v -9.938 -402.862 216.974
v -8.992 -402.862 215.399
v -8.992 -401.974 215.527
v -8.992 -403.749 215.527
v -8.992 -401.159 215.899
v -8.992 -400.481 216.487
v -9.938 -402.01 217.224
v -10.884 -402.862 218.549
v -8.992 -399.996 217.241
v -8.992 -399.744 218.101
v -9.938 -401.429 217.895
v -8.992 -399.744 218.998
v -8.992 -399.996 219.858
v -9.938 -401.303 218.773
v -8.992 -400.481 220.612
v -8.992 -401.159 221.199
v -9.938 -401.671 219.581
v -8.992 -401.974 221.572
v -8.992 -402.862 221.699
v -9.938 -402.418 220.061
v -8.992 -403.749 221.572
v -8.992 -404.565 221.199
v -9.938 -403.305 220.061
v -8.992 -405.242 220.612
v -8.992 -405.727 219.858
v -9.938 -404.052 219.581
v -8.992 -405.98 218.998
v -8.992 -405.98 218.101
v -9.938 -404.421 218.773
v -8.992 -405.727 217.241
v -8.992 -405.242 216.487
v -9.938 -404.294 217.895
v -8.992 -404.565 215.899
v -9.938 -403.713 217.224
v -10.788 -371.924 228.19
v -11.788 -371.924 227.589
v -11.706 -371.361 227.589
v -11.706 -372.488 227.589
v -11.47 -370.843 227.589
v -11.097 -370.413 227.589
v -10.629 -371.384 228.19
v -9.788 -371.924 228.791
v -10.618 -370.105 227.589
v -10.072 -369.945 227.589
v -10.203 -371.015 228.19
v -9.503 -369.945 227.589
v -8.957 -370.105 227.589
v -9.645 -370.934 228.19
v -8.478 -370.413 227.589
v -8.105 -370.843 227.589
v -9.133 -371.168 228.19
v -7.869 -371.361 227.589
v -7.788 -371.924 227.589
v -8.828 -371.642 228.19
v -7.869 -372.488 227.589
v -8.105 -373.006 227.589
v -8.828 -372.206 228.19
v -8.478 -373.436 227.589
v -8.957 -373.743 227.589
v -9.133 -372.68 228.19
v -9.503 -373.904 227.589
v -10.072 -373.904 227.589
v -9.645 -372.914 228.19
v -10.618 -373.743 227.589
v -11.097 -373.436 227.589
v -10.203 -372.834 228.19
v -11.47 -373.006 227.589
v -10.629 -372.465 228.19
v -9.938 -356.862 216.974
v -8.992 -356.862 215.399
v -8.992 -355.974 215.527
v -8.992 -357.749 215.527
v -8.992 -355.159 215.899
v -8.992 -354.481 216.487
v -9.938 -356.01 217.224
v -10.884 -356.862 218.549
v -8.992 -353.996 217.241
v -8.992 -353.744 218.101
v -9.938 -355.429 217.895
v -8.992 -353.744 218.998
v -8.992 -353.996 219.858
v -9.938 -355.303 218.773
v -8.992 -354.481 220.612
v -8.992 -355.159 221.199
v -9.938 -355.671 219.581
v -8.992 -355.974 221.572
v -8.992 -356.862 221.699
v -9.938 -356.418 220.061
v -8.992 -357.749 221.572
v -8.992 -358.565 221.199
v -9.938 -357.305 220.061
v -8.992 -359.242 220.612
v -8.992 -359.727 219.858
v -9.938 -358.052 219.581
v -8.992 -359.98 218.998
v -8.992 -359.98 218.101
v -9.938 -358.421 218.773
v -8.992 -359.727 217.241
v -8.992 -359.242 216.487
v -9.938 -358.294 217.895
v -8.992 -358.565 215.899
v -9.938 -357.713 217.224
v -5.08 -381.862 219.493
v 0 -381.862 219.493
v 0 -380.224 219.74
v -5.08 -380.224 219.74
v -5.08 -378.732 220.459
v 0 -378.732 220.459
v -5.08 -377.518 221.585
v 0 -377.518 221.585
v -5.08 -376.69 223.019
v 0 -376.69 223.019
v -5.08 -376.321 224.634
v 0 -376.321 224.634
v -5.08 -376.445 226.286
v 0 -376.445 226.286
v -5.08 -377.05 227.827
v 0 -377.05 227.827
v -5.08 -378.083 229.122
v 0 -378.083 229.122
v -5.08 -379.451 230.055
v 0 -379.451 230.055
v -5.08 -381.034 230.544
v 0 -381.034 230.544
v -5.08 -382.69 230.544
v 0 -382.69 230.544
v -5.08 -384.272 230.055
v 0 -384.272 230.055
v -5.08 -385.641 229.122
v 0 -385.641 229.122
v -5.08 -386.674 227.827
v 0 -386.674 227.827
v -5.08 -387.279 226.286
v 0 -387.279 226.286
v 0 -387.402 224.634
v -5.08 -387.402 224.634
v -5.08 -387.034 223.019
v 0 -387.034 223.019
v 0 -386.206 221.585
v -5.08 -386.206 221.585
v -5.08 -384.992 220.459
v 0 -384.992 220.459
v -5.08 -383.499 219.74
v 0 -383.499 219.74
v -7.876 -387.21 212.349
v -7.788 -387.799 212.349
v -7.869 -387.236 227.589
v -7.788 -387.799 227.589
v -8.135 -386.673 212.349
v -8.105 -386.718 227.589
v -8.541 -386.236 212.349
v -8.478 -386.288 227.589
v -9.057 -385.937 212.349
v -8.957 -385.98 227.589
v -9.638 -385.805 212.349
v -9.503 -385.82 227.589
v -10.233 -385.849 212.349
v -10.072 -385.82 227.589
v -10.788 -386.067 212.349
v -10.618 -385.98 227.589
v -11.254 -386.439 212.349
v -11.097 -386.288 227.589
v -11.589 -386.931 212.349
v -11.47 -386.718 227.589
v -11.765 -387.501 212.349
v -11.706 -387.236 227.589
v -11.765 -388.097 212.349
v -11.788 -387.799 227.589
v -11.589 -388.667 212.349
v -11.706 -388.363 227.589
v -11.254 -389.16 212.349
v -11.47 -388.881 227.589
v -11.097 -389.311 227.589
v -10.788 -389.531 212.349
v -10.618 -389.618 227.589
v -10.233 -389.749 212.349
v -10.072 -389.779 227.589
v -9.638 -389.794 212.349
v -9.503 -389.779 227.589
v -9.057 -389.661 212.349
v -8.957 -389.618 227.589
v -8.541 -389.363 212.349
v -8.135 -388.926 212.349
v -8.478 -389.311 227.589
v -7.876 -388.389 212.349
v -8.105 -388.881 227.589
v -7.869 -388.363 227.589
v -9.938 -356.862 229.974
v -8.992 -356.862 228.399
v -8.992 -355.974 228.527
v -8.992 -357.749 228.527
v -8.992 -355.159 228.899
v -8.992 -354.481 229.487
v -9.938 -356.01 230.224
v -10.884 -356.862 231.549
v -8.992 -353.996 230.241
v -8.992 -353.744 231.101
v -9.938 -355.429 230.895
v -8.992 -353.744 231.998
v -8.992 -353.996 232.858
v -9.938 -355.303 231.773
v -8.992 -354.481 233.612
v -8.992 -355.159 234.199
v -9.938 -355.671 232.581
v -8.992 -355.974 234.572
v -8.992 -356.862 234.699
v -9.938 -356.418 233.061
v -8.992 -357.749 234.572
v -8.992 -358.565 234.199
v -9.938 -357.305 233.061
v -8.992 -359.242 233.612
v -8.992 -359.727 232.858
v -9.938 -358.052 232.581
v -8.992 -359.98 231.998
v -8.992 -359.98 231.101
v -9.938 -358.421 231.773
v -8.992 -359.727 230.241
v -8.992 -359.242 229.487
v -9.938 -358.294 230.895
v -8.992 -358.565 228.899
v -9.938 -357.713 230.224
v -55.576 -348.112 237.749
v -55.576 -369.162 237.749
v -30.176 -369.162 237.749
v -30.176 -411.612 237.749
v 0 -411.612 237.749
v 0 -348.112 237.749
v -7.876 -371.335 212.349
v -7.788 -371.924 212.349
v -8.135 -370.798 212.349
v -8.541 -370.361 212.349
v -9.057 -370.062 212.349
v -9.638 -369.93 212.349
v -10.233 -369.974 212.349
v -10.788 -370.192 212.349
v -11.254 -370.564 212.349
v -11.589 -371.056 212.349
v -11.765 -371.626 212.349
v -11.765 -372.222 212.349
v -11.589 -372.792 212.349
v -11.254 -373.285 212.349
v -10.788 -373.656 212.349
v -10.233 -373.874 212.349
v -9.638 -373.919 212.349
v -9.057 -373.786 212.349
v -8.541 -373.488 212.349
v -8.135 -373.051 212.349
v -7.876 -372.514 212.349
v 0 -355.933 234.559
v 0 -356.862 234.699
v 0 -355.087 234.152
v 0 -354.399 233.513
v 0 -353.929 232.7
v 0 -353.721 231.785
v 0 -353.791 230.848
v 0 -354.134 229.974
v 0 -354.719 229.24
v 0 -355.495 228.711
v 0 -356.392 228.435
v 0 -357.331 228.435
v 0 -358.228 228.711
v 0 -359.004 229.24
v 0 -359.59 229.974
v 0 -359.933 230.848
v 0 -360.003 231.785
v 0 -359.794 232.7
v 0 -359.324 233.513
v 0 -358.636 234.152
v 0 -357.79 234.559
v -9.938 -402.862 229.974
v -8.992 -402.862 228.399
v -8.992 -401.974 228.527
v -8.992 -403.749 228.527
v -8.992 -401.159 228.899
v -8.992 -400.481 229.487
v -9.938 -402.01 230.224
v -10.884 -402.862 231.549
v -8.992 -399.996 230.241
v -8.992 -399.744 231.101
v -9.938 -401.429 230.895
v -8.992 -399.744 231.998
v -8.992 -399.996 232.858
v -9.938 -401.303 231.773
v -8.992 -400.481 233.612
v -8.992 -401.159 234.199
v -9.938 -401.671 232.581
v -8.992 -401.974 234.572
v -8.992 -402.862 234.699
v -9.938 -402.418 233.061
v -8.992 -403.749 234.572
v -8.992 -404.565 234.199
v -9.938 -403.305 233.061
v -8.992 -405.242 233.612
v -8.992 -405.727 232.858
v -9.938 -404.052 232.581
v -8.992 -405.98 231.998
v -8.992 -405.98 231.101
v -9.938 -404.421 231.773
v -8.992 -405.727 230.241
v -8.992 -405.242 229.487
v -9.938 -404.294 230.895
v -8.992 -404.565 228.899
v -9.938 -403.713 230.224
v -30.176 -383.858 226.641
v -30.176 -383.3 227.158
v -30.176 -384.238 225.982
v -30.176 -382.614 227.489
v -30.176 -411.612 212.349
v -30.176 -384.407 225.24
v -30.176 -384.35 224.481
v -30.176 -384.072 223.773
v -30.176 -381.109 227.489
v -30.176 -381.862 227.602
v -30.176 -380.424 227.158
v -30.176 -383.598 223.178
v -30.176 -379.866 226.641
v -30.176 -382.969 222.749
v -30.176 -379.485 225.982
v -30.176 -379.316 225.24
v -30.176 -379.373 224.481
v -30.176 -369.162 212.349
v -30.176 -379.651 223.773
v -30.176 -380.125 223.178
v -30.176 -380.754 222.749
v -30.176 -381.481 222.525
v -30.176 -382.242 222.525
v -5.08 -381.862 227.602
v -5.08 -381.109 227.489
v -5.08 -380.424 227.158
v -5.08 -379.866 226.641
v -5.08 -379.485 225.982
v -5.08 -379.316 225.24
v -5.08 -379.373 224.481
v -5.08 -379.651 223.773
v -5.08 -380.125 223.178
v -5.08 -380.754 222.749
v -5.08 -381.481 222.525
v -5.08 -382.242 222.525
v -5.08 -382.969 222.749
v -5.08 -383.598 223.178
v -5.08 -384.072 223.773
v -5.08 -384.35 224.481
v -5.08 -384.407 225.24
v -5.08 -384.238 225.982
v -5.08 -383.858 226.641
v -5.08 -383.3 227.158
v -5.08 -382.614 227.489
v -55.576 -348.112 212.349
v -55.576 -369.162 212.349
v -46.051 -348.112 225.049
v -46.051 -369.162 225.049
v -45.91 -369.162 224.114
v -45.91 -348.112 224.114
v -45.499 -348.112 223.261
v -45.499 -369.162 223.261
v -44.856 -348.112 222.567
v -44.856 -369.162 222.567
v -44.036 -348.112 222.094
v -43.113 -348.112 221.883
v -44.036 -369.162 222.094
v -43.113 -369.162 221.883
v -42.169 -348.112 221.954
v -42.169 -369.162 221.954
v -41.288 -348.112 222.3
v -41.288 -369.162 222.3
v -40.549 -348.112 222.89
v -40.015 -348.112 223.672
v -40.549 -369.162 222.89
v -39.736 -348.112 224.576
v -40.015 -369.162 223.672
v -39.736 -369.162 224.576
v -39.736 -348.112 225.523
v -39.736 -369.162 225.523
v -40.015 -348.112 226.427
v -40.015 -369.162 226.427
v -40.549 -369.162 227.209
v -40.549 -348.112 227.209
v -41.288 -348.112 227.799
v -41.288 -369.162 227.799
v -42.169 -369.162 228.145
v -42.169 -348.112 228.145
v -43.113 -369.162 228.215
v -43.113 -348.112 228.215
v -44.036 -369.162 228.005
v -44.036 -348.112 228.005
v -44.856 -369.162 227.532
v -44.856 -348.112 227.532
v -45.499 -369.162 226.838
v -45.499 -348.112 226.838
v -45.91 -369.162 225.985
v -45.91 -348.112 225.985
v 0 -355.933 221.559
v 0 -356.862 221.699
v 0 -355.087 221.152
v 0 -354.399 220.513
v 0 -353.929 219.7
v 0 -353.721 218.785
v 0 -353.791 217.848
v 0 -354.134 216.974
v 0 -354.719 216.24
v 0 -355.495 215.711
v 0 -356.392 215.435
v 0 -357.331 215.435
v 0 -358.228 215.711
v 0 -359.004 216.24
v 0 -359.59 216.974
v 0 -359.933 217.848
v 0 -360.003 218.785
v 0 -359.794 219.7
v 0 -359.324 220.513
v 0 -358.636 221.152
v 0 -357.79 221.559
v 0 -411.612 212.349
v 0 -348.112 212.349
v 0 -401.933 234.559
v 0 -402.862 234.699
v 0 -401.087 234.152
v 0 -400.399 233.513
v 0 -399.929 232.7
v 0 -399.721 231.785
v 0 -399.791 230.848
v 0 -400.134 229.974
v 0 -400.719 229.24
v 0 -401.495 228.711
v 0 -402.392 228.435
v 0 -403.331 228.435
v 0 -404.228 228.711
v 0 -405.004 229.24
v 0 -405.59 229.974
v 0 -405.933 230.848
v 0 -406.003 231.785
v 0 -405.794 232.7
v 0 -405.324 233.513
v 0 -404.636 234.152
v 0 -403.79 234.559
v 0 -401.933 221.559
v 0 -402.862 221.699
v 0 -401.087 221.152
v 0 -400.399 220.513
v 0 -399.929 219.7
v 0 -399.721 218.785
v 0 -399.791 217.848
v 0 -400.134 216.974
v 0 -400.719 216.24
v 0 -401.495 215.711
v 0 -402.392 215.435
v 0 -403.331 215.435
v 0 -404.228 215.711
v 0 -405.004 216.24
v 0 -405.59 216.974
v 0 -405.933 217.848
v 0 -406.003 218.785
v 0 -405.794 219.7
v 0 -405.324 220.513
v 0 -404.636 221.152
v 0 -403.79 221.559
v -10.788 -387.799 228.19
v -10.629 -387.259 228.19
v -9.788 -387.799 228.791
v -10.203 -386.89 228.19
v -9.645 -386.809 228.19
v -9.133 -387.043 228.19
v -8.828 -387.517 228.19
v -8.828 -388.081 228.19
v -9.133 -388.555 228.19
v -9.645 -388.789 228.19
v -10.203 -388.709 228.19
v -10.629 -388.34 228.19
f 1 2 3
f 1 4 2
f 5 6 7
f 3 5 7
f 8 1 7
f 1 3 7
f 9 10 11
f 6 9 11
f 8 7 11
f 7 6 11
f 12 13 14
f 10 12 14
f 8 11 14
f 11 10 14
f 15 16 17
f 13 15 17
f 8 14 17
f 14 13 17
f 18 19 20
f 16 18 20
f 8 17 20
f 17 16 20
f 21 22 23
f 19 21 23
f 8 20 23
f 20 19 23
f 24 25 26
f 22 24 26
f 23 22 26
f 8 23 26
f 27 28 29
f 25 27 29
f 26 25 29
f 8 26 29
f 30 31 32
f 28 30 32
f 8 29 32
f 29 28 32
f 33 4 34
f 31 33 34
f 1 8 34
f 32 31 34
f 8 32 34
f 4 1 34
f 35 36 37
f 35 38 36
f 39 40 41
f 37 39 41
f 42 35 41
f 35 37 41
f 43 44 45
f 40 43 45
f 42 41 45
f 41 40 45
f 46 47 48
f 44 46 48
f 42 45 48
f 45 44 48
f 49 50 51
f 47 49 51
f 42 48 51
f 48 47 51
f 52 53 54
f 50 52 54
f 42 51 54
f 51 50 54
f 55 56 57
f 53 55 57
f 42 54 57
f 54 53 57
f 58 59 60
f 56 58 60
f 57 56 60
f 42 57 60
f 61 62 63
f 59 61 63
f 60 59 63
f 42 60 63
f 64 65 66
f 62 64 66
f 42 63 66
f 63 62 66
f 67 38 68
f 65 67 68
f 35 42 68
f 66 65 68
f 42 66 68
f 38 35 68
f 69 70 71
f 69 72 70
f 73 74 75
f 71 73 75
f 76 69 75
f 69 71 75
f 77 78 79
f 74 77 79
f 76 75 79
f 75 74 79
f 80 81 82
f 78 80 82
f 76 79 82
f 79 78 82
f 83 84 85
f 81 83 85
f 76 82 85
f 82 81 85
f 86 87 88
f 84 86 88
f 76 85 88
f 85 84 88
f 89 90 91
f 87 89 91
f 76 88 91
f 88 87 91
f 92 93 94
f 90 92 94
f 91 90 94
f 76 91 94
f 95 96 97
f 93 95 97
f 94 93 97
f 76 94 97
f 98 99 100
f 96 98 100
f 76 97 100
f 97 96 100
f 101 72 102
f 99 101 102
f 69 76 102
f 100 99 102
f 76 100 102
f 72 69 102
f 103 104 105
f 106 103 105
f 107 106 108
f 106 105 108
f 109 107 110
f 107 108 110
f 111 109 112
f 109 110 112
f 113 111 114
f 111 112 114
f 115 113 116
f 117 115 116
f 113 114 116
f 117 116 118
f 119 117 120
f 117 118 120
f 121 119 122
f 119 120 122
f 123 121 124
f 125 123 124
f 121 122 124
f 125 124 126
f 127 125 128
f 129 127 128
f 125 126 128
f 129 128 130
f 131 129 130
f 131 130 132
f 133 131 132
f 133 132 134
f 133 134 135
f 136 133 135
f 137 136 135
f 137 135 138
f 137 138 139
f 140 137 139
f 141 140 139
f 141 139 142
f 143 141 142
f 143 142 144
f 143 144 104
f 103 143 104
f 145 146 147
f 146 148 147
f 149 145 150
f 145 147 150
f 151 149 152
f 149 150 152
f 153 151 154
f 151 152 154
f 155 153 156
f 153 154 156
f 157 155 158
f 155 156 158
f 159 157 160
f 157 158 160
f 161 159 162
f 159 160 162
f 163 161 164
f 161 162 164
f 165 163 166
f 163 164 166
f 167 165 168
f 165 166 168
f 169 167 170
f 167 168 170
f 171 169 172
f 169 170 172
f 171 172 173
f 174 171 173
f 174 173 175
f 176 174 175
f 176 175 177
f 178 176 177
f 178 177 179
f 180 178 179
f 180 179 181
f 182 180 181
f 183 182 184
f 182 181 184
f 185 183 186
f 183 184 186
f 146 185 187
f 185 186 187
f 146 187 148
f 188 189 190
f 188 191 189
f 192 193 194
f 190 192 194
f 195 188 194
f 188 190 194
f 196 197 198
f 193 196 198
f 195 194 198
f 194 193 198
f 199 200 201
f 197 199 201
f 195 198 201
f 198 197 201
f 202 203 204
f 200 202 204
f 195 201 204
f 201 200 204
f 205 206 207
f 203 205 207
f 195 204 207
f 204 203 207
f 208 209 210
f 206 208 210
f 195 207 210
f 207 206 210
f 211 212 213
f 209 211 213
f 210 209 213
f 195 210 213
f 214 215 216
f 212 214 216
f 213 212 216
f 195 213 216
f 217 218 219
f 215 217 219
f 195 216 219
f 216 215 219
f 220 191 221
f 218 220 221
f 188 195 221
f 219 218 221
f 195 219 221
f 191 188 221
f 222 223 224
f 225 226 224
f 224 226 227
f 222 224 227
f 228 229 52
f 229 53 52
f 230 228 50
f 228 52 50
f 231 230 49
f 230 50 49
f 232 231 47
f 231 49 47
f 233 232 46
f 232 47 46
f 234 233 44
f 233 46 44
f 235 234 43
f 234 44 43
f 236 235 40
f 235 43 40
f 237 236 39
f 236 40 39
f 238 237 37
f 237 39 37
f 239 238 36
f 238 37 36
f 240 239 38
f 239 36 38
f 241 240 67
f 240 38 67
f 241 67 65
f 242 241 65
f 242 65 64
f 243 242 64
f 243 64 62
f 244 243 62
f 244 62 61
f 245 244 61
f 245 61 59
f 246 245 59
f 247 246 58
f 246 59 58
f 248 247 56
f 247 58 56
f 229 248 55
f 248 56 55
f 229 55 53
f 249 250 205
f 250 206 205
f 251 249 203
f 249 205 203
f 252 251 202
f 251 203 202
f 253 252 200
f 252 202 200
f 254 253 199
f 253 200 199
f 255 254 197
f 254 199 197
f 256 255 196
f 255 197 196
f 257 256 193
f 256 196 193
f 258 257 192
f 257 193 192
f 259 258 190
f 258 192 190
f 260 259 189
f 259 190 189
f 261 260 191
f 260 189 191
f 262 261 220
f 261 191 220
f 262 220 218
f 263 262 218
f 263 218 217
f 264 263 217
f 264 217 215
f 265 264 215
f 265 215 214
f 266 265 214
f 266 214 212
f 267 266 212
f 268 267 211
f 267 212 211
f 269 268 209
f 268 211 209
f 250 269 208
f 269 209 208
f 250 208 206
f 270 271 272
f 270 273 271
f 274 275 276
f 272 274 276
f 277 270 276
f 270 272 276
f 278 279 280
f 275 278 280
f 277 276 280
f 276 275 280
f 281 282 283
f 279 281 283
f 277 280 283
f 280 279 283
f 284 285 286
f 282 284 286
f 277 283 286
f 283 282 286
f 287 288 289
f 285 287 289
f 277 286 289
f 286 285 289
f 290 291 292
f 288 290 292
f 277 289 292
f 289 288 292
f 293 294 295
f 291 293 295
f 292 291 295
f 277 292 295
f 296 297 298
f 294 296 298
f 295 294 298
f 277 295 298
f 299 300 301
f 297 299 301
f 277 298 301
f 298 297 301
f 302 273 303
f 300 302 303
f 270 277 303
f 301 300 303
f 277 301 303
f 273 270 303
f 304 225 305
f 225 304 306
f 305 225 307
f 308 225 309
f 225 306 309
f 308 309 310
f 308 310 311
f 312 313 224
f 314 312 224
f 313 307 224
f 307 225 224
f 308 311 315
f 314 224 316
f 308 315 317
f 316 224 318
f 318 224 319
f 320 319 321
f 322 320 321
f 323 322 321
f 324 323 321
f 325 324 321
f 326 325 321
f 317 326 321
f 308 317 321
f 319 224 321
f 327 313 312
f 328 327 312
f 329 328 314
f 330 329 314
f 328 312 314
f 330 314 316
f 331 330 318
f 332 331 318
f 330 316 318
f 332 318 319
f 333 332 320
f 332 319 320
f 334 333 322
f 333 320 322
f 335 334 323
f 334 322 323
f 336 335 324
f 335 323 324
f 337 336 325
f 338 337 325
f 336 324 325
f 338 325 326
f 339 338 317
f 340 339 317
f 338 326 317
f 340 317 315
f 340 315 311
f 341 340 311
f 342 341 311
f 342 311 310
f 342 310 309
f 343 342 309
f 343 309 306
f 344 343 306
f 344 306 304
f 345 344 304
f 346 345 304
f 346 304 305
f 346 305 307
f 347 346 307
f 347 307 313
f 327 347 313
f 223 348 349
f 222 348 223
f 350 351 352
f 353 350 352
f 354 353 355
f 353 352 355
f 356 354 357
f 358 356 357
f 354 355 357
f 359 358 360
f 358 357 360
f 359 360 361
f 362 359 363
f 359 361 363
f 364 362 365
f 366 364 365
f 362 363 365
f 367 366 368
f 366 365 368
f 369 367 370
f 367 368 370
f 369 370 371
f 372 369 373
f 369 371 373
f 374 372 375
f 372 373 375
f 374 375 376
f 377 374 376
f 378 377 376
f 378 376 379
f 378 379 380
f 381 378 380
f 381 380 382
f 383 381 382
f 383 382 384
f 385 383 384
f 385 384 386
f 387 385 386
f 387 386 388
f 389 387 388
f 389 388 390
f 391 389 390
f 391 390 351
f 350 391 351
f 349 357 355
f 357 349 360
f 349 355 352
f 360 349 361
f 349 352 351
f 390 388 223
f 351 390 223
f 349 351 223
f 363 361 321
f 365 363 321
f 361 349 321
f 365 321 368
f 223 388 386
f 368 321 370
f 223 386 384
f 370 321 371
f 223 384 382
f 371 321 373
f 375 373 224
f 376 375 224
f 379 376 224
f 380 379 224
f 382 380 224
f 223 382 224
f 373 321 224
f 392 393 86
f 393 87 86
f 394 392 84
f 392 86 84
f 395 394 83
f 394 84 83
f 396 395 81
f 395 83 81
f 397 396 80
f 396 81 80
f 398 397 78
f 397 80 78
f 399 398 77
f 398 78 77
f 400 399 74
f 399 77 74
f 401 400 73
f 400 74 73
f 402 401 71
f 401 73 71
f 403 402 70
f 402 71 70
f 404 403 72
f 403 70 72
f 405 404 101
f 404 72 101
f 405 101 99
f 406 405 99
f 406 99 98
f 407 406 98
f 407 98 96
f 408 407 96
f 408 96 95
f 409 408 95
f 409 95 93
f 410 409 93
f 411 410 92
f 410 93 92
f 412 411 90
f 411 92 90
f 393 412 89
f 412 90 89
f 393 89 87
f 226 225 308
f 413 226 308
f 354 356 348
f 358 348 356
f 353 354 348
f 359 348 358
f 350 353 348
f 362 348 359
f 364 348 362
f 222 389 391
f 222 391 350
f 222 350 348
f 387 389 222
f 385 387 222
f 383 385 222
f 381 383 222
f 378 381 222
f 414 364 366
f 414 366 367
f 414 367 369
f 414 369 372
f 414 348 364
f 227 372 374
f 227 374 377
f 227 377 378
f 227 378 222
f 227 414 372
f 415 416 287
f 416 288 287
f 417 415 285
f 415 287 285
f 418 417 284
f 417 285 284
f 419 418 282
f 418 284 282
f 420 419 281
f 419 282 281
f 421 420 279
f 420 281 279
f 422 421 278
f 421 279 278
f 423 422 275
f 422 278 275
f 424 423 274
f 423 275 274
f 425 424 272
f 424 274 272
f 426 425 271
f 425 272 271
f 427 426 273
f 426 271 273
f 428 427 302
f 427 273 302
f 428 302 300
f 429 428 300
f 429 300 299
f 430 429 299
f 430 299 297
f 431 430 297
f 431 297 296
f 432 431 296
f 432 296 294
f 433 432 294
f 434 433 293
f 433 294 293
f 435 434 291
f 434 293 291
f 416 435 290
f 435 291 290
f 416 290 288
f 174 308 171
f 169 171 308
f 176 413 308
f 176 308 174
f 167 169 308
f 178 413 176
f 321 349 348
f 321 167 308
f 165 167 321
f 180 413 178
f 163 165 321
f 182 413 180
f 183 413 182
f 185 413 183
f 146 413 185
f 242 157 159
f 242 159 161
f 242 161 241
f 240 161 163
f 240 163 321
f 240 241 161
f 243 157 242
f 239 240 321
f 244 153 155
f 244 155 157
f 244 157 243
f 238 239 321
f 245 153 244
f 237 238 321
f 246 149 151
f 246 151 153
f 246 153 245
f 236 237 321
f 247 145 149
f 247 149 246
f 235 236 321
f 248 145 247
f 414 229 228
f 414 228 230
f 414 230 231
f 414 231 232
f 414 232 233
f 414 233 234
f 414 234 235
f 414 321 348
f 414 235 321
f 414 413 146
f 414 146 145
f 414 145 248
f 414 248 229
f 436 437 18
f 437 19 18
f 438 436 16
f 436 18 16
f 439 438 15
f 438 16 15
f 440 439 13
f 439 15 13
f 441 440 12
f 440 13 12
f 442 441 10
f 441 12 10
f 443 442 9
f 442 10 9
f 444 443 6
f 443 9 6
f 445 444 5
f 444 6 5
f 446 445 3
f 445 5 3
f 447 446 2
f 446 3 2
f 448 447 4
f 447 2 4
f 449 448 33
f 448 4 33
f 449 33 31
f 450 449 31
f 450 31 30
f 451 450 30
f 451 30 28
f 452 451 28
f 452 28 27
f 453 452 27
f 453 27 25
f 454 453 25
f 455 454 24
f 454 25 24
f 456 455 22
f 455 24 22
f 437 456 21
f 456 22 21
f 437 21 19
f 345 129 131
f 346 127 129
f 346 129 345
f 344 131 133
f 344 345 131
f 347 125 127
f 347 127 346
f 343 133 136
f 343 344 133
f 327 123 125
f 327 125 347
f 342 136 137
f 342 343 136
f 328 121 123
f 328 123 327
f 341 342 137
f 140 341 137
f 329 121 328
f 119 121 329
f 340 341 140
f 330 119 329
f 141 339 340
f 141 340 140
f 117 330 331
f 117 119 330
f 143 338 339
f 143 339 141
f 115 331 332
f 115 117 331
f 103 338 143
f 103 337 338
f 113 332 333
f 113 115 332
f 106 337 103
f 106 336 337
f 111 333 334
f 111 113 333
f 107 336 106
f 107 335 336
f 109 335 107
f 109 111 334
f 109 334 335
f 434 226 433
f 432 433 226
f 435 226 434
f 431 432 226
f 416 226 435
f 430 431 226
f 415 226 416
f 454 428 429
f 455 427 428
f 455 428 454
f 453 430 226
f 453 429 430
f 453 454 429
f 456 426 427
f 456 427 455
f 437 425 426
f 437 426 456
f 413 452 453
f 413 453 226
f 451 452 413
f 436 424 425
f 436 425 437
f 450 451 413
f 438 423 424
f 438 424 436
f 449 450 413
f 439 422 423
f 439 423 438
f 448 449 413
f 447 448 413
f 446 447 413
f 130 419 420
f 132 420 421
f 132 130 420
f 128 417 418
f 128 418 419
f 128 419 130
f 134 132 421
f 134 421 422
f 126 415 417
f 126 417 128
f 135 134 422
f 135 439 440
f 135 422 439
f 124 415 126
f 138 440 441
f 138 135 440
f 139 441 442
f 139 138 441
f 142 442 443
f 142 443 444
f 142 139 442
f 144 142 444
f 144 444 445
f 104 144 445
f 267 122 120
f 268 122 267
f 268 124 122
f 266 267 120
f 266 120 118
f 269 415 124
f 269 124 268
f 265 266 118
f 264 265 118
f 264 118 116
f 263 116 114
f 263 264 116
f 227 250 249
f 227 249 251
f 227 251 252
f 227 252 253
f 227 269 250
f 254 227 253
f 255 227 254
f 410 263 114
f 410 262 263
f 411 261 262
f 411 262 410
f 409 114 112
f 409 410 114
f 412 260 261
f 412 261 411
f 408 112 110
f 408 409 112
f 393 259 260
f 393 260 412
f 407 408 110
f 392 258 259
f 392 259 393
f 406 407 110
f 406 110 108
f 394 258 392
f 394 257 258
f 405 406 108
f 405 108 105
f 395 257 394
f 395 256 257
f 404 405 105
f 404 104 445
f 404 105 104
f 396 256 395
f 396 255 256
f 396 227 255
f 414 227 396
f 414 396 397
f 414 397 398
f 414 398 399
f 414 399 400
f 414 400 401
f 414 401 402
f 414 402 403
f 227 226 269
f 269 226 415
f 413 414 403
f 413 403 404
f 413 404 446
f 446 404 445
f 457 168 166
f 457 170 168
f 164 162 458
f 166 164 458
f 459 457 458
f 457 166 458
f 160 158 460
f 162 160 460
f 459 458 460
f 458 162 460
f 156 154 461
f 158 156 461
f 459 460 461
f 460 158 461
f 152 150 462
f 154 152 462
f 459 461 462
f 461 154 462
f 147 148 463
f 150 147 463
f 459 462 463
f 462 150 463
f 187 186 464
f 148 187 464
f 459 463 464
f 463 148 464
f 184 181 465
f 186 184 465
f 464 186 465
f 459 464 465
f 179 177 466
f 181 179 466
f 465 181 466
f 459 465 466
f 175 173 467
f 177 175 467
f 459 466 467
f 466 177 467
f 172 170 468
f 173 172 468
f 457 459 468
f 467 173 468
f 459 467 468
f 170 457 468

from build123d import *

# Parameters (mm, degrees)
SKETCH2_W                                           = 25.4
SKETCH2_H                                           = 63.5
BOSS_EXTRUDE1_DEPTH                                 = 30.17596
SKETCH3_W                                           = 25.4
SKETCH3_H                                           = 21.05
BOSS_EXTRUDE2_DEPTH                                 = 25.4
F_1_4_0_25_DIAMETER_HOLE1_D                         = 6.35
F_1_0MM_DOWEL_HOLE1_D                               = 6.3
F_1_0MM_DOWEL_HOLE1_DEPTH                           = 8.9916
F_1_0MM_DOWEL_HOLE1_TIP                             = 1.89271095
TAP_DRILL_FOR_5_HELICOIL0_D                         = 4
TAP_DRILL_FOR_5_HELICOIL0_DEPTH                     = 15.24
TAP_DRILL_FOR_5_HELICOIL0_TIP                       = 1.201721238
CBORE_FOR_10_BINDING_HEAD_MACHINE_SCREW_D           = 5.1054
CBORE_FOR_10_BINDING_HEAD_MACHINE_SCREW_DEPTH       = 30.17596
CBORE_FOR_10_BINDING_HEAD_MACHINE_SCREW_CBORE_D     = 11.1125
CBORE_FOR_10_BINDING_HEAD_MACHINE_SCREW_CBORE_DEPTH = 5.08


with BuildPart() as part:
    # Sketch2 → Boss-Extrude1 (new body)
    with BuildSketch(Plane(origin=(0, 0, 0), x_dir=(0, 0, -1), z_dir=(1, 0, 0))):
        with Locations((-225.049350785, -379.861725806)):
            Rectangle(SKETCH2_W, SKETCH2_H)
    extrude(amount=-BOSS_EXTRUDE1_DEPTH)

    # Sketch3 → Boss-Extrude2 (add)
    with BuildSketch(Plane.ZY.offset(30.17596)):
        with Locations((225.049350785, -358.636725806)):
            Rectangle(SKETCH3_W, SKETCH3_H)
    extrude(amount=BOSS_EXTRUDE2_DEPTH)

    # 1/4 (0.25) Diameter Hole1 (through all)
    with Locations(Plane(origin=(0, -348.111725806, 0), x_dir=(1, 0, 0), z_dir=(0, 1, 0))):
        with Locations((-42.87596, -225.049350785)):
            Hole(F_1_4_0_25_DIAMETER_HOLE1_D / 2)

    # Ø1.0mm Dowel Hole1
    with Locations(Plane(origin=(0, 0, 0), x_dir=(0, 0, -1), z_dir=(1, 0, 0))):
        with Locations((-231.549350785, -356.861725806), (-218.549350785, -356.861725806), (-218.549350785, -402.861725806), (-231.549350785, -402.861725806)):
            Hole(F_1_0MM_DOWEL_HOLE1_D / 2, depth=F_1_0MM_DOWEL_HOLE1_DEPTH)
            with Locations((0, 0, -(F_1_0MM_DOWEL_HOLE1_DEPTH + F_1_0MM_DOWEL_HOLE1_TIP / 2))):  # 118° drill point
                Cone(0, F_1_0MM_DOWEL_HOLE1_D / 2, F_1_0MM_DOWEL_HOLE1_TIP, mode=Mode.SUBTRACT)

    # Tap Drill for #5 Helicoil0
    with Locations(Plane(origin=(0, 0, 212.349350785), x_dir=(-1, 0, 0), z_dir=(0, 0, -1))):
        with Locations((9.7875, -371.924225806), (9.7875, -387.799225806)):
            Hole(TAP_DRILL_FOR_5_HELICOIL0_D / 2, depth=TAP_DRILL_FOR_5_HELICOIL0_DEPTH)
            with Locations((0, 0, -(TAP_DRILL_FOR_5_HELICOIL0_DEPTH + TAP_DRILL_FOR_5_HELICOIL0_TIP / 2))):  # 118° drill point
                Cone(0, TAP_DRILL_FOR_5_HELICOIL0_D / 2, TAP_DRILL_FOR_5_HELICOIL0_TIP, mode=Mode.SUBTRACT)

    # CBORE for #10 Binding Head Machine Screw1
    with Locations(Plane(origin=(0, 0, 0), x_dir=(0, 0, -1), z_dir=(1, 0, 0))):
        with Locations((-225.049350785, -381.861725806)):
            CounterBoreHole(CBORE_FOR_10_BINDING_HEAD_MACHINE_SCREW_D / 2, CBORE_FOR_10_BINDING_HEAD_MACHINE_SCREW_CBORE_D / 2, CBORE_FOR_10_BINDING_HEAD_MACHINE_SCREW_CBORE_DEPTH, depth=CBORE_FOR_10_BINDING_HEAD_MACHINE_SCREW_DEPTH)


solid = part.part
